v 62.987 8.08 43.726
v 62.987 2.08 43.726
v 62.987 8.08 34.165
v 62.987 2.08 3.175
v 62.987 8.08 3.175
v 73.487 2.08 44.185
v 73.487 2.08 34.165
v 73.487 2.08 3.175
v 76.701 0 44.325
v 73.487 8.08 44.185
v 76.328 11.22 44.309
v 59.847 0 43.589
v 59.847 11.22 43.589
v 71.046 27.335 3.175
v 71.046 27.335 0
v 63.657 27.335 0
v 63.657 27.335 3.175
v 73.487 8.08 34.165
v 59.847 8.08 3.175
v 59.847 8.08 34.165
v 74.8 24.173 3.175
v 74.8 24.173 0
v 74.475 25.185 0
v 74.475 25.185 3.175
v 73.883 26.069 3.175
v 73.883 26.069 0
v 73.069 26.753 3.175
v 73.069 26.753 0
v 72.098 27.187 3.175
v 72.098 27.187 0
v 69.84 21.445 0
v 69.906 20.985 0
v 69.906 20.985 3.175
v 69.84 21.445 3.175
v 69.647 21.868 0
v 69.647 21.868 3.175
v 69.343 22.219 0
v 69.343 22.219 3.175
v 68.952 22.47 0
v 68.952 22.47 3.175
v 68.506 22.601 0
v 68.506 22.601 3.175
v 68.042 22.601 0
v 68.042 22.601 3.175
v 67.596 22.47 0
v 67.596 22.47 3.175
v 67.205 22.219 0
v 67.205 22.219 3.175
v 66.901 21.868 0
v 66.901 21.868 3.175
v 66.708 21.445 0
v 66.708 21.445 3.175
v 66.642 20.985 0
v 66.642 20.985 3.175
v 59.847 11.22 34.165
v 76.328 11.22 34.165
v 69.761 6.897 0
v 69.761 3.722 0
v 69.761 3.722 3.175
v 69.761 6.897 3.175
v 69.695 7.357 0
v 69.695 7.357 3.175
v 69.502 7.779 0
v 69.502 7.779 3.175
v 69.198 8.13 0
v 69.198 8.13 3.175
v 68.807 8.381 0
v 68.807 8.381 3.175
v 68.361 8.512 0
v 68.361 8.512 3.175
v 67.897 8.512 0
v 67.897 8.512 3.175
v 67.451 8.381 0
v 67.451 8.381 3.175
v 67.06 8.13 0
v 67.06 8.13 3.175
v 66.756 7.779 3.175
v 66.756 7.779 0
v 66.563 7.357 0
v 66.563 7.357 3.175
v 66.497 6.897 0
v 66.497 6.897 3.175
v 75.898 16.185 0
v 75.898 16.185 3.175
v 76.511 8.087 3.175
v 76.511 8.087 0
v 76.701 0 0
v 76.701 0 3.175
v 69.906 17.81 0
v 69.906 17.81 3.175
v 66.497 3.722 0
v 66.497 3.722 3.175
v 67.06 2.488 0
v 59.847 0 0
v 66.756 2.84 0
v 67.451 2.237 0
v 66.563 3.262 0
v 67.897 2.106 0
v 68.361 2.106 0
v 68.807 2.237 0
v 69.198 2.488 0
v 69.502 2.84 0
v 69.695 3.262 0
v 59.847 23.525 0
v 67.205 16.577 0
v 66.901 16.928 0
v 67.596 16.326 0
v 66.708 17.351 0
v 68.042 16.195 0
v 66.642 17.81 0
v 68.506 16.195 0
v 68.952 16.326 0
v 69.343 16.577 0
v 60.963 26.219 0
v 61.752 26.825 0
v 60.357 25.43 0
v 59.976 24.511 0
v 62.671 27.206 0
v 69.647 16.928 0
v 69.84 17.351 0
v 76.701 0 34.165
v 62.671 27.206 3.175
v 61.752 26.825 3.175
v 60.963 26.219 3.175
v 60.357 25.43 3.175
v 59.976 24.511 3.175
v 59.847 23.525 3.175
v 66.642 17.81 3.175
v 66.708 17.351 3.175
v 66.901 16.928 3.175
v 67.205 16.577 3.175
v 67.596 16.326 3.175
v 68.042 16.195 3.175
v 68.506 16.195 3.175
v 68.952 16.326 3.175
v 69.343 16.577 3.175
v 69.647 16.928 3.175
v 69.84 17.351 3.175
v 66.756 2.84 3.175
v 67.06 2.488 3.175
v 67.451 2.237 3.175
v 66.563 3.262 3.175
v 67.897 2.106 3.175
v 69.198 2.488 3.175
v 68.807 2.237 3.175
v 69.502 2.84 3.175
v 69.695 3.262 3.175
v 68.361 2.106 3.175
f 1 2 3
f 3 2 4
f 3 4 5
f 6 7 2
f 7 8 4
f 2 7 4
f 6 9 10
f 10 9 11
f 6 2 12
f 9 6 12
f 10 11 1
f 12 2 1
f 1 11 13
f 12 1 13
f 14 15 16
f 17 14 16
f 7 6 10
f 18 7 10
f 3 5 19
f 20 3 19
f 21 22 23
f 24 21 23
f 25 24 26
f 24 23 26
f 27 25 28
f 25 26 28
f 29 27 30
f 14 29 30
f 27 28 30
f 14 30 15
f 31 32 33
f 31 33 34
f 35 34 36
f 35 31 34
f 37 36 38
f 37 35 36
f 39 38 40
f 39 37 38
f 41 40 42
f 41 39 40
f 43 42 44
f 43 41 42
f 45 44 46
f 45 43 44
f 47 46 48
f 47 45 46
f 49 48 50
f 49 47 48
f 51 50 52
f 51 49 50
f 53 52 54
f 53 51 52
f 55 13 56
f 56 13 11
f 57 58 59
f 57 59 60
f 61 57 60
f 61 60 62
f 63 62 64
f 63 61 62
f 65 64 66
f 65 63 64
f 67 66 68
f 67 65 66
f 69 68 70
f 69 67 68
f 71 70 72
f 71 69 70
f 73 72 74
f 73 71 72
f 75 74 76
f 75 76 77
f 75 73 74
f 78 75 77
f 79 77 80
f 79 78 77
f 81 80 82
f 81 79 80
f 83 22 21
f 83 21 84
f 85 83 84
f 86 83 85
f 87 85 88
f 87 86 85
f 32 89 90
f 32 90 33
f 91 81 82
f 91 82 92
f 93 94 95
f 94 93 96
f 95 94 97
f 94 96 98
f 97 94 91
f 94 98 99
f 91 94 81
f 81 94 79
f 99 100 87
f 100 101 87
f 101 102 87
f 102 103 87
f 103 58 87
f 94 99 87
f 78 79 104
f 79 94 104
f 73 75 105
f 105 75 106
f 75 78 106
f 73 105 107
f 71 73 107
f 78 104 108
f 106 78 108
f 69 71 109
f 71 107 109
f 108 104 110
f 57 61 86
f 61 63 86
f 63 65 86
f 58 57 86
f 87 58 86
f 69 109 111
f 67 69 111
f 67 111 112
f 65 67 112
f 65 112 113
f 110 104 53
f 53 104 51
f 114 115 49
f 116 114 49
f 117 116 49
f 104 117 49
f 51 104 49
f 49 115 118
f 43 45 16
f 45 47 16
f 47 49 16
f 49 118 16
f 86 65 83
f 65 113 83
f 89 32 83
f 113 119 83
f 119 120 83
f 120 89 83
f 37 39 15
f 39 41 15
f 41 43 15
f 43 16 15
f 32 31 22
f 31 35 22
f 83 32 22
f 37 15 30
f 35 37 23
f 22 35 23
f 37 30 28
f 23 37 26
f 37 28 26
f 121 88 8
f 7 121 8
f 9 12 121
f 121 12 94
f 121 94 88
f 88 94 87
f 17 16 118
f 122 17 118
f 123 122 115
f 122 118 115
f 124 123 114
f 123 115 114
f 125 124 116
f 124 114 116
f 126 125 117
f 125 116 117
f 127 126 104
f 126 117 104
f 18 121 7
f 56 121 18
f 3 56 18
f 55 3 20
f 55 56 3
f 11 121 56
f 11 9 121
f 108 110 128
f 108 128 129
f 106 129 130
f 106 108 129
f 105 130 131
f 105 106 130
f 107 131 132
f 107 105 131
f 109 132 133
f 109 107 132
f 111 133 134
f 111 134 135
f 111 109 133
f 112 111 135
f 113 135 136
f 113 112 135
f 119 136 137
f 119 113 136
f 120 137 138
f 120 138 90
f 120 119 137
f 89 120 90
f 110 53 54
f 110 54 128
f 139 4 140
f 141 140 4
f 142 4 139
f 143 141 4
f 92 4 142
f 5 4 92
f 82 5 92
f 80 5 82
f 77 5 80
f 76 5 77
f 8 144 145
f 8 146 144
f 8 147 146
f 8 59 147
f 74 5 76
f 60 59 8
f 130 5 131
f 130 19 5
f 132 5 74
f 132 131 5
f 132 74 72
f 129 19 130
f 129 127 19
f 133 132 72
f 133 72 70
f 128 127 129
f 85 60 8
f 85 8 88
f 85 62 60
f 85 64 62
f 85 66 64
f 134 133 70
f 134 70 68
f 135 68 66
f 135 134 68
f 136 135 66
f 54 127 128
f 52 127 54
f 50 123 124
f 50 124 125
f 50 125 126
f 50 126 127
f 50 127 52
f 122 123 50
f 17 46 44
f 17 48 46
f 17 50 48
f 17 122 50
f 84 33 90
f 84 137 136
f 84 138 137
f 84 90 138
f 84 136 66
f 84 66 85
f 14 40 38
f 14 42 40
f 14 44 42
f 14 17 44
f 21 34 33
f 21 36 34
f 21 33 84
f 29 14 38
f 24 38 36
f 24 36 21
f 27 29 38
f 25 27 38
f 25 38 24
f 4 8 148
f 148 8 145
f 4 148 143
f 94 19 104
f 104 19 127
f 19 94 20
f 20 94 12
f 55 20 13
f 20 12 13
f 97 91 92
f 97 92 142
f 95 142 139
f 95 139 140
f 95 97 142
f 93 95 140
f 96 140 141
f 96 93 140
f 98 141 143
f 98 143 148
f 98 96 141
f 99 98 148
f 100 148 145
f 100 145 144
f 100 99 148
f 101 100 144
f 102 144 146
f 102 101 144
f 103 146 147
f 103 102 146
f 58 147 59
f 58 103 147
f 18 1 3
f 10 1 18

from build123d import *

# Parameters (mm, degrees)
BOSS_EXTRUDE1_DEPTH = 3.175
BOSS_EXTRUDE2_DEPTH = 41.15
SKETCH3_W           = 10.5
SKETCH3_H           = 6
BOSS_EXTRUDE3_DEPTH = 10.16
CUT_EXTRUDE1_DEPTH  = 39.555801056


with BuildPart() as part:
    # Sketch1 → Boss-Extrude1 (new body)
    with BuildSketch(Plane.XY):
        with BuildLine():
            Line((71.045544716, 27.335394647), (63.656604316, 27.335394647))
            ThreePointArc((63.656604316, 27.335394647), (60.962527479, 26.219471483), (59.846604316, 23.525394647))
            Line((59.846604316, 23.525394647), (59.846604316, -23.525394647))
            ThreePointArc((59.846604316, -23.525394647), (60.962527479, -26.219471483), (63.656604316, -27.335394647))
            Line((63.656604316, -27.335394647), (71.045544716, -27.335394647))
            ThreePointArc((71.045544716, -27.335394647), (73.499934786, -26.439510188), (74.800072929, -24.173173852))
            add(Edge.make_bspline(
                [(76.701202739, 0), (76.701202739, -8.04022214), (76.161781205, -16.280712803), (74.800072929, -24.173173852)],
                knots=[0, 0, 0, 0, 0.259951787, 0.259951787, 0.259951787, 0.259951787], degree=3))
            add(Edge.make_bspline(
                [(74.800072929, 24.173173852), (76.161781205, 16.280712803), (76.701202739, 8.04022214), (76.701202739, 0)],
                knots=[0.740048213, 0.740048213, 0.740048213, 0.740048213, 1, 1, 1, 1], degree=3))
            ThreePointArc((74.800072929, 24.173173852), (73.499934786, 26.439510188), (71.045544716, 27.335394647))
        make_face()
        with BuildLine():
            Line((66.641953527, -20.985394647), (66.641953527, -17.810394647))
            ThreePointArc((66.641953527, -17.810394647), (68.273903527, -16.178444647), (69.905853527, -17.810394647))
            Line((69.905853527, -17.810394647), (69.905853527, -20.985394647))
            ThreePointArc((69.905853527, -20.985394647), (68.273903527, -22.617344647), (66.641953527, -20.985394647))
        make_face(mode=Mode.SUBTRACT)
        with BuildLine():
            Line((66.497091774, -6.896821773), (66.497091774, -3.721821773))
            ThreePointArc((66.497091774, -3.721821773), (68.129041774, -2.089871773), (69.760991774, -3.721821773))
            Line((69.760991774, -3.721821773), (69.760991774, -6.896821773))
            ThreePointArc((69.760991774, -6.896821773), (68.129041774, -8.528771773), (66.497091774, -6.896821773))
        make_face(mode=Mode.SUBTRACT)
        with BuildLine():
            Line((66.641953527, 20.985394647), (66.641953527, 17.810394647))
            ThreePointArc((66.641953527, 17.810394647), (68.273903527, 16.178444647), (69.905853527, 17.810394647))
            Line((69.905853527, 17.810394647), (69.905853527, 20.985394647))
            ThreePointArc((69.905853527, 20.985394647), (68.273903527, 22.617344647), (66.641953527, 20.985394647))
        make_face(mode=Mode.SUBTRACT)
        with BuildLine():
            Line((66.497091774, 6.896821773), (66.497091774, 3.721821773))
            ThreePointArc((66.497091774, 3.721821773), (68.129041774, 2.089871773), (69.760991774, 3.721821773))
            Line((69.760991774, 3.721821773), (69.760991774, 6.896821773))
            ThreePointArc((69.760991774, 6.896821773), (68.129041774, 8.528771773), (66.497091774, 6.896821773))
        make_face(mode=Mode.SUBTRACT)
    extrude(amount=BOSS_EXTRUDE1_DEPTH)

    # Sketch2 → Boss-Extrude2 (add)
    with BuildSketch(Plane.XY.offset(3.175)):
        Polygon((76.701202739, 0), (73.487010624, 2.08), (62.987010624, 2.08), (62.987010624, 8.08), (59.846604316, 8.08), (59.846604316, -8.08), (62.987010624, -8.08), (62.987010624, -2.08), (73.487010624, -2.08), align=None)
    extrude(amount=BOSS_EXTRUDE2_DEPTH)

    # Sketch3 → Boss-Extrude3 (add)
    with BuildSketch(Plane.XY.offset(44.325)):
        with BuildLine():
            Line((59.846604316, 8.08), (59.846604316, 11.220406309))
            Line((59.846604316, 11.220406309), (76.327728698, 11.220406308))
            add(Edge.make_bspline(
                [(76.701202739, 0), (76.701202739, 3.71540513), (76.586015455, 7.473575307), (76.327728698, 11.220406308)],
                knots=[0, 0, 0, 0, 0.120124318, 0.120124318, 0.120124318, 0.120124318], degree=3))
            add(Edge.make_bspline(
                [(76.701202739, 0), (76.701202739, -3.71540513), (76.586015455, -7.473575307), (76.327728698, -11.220406308)],
                knots=[0, 0, 0, 0, 0.120124318, 0.120124318, 0.120124318, 0.120124318], degree=3))
            Line((76.327728698, -11.220406308), (59.846604316, -11.220406309))
            Line((59.846604316, -11.220406309), (59.846604316, -8.08))
            Line((59.846604316, -8.08), (59.846604316, 8.08))
        make_face()
        with Locations((68.237010624, 5.08)):
            Rectangle(SKETCH3_W, SKETCH3_H, mode=Mode.SUBTRACT)
        with Locations((68.237010624, -5.08)):
            Rectangle(SKETCH3_W, SKETCH3_H, mode=Mode.SUBTRACT)
    extrude(amount=-BOSS_EXTRUDE3_DEPTH)

    # Sketch4 → Cut-Extrude1 (cut, through all)
    with BuildSketch(Plane(origin=(0, 11.220406309, 0), x_dir=(1, 0, 0), z_dir=(0, 1, 0))):
        Polygon((76.701202739, -44.325), (59.846604316, -43.589112341), (59.846604316, -44.325), align=None)
    extrude(amount=-CUT_EXTRUDE1_DEPTH, mode=Mode.SUBTRACT)


with BuildPart() as body_2:
    # Split1: the piece on the far side of the plane
    add(part.part)
    split(bisect_by=Plane(origin=(0, 0, 0), x_dir=(1, 0, 0), z_dir=(0, 1, 0)), keep=Keep.BOTTOM)


with BuildPart() as part_1:
    add(part.part)

    # Split1
    split(bisect_by=Plane(origin=(0, 0, 0), x_dir=(1, 0, 0), z_dir=(0, 1, 0)), keep=Keep.TOP)


solid = part_1.part
